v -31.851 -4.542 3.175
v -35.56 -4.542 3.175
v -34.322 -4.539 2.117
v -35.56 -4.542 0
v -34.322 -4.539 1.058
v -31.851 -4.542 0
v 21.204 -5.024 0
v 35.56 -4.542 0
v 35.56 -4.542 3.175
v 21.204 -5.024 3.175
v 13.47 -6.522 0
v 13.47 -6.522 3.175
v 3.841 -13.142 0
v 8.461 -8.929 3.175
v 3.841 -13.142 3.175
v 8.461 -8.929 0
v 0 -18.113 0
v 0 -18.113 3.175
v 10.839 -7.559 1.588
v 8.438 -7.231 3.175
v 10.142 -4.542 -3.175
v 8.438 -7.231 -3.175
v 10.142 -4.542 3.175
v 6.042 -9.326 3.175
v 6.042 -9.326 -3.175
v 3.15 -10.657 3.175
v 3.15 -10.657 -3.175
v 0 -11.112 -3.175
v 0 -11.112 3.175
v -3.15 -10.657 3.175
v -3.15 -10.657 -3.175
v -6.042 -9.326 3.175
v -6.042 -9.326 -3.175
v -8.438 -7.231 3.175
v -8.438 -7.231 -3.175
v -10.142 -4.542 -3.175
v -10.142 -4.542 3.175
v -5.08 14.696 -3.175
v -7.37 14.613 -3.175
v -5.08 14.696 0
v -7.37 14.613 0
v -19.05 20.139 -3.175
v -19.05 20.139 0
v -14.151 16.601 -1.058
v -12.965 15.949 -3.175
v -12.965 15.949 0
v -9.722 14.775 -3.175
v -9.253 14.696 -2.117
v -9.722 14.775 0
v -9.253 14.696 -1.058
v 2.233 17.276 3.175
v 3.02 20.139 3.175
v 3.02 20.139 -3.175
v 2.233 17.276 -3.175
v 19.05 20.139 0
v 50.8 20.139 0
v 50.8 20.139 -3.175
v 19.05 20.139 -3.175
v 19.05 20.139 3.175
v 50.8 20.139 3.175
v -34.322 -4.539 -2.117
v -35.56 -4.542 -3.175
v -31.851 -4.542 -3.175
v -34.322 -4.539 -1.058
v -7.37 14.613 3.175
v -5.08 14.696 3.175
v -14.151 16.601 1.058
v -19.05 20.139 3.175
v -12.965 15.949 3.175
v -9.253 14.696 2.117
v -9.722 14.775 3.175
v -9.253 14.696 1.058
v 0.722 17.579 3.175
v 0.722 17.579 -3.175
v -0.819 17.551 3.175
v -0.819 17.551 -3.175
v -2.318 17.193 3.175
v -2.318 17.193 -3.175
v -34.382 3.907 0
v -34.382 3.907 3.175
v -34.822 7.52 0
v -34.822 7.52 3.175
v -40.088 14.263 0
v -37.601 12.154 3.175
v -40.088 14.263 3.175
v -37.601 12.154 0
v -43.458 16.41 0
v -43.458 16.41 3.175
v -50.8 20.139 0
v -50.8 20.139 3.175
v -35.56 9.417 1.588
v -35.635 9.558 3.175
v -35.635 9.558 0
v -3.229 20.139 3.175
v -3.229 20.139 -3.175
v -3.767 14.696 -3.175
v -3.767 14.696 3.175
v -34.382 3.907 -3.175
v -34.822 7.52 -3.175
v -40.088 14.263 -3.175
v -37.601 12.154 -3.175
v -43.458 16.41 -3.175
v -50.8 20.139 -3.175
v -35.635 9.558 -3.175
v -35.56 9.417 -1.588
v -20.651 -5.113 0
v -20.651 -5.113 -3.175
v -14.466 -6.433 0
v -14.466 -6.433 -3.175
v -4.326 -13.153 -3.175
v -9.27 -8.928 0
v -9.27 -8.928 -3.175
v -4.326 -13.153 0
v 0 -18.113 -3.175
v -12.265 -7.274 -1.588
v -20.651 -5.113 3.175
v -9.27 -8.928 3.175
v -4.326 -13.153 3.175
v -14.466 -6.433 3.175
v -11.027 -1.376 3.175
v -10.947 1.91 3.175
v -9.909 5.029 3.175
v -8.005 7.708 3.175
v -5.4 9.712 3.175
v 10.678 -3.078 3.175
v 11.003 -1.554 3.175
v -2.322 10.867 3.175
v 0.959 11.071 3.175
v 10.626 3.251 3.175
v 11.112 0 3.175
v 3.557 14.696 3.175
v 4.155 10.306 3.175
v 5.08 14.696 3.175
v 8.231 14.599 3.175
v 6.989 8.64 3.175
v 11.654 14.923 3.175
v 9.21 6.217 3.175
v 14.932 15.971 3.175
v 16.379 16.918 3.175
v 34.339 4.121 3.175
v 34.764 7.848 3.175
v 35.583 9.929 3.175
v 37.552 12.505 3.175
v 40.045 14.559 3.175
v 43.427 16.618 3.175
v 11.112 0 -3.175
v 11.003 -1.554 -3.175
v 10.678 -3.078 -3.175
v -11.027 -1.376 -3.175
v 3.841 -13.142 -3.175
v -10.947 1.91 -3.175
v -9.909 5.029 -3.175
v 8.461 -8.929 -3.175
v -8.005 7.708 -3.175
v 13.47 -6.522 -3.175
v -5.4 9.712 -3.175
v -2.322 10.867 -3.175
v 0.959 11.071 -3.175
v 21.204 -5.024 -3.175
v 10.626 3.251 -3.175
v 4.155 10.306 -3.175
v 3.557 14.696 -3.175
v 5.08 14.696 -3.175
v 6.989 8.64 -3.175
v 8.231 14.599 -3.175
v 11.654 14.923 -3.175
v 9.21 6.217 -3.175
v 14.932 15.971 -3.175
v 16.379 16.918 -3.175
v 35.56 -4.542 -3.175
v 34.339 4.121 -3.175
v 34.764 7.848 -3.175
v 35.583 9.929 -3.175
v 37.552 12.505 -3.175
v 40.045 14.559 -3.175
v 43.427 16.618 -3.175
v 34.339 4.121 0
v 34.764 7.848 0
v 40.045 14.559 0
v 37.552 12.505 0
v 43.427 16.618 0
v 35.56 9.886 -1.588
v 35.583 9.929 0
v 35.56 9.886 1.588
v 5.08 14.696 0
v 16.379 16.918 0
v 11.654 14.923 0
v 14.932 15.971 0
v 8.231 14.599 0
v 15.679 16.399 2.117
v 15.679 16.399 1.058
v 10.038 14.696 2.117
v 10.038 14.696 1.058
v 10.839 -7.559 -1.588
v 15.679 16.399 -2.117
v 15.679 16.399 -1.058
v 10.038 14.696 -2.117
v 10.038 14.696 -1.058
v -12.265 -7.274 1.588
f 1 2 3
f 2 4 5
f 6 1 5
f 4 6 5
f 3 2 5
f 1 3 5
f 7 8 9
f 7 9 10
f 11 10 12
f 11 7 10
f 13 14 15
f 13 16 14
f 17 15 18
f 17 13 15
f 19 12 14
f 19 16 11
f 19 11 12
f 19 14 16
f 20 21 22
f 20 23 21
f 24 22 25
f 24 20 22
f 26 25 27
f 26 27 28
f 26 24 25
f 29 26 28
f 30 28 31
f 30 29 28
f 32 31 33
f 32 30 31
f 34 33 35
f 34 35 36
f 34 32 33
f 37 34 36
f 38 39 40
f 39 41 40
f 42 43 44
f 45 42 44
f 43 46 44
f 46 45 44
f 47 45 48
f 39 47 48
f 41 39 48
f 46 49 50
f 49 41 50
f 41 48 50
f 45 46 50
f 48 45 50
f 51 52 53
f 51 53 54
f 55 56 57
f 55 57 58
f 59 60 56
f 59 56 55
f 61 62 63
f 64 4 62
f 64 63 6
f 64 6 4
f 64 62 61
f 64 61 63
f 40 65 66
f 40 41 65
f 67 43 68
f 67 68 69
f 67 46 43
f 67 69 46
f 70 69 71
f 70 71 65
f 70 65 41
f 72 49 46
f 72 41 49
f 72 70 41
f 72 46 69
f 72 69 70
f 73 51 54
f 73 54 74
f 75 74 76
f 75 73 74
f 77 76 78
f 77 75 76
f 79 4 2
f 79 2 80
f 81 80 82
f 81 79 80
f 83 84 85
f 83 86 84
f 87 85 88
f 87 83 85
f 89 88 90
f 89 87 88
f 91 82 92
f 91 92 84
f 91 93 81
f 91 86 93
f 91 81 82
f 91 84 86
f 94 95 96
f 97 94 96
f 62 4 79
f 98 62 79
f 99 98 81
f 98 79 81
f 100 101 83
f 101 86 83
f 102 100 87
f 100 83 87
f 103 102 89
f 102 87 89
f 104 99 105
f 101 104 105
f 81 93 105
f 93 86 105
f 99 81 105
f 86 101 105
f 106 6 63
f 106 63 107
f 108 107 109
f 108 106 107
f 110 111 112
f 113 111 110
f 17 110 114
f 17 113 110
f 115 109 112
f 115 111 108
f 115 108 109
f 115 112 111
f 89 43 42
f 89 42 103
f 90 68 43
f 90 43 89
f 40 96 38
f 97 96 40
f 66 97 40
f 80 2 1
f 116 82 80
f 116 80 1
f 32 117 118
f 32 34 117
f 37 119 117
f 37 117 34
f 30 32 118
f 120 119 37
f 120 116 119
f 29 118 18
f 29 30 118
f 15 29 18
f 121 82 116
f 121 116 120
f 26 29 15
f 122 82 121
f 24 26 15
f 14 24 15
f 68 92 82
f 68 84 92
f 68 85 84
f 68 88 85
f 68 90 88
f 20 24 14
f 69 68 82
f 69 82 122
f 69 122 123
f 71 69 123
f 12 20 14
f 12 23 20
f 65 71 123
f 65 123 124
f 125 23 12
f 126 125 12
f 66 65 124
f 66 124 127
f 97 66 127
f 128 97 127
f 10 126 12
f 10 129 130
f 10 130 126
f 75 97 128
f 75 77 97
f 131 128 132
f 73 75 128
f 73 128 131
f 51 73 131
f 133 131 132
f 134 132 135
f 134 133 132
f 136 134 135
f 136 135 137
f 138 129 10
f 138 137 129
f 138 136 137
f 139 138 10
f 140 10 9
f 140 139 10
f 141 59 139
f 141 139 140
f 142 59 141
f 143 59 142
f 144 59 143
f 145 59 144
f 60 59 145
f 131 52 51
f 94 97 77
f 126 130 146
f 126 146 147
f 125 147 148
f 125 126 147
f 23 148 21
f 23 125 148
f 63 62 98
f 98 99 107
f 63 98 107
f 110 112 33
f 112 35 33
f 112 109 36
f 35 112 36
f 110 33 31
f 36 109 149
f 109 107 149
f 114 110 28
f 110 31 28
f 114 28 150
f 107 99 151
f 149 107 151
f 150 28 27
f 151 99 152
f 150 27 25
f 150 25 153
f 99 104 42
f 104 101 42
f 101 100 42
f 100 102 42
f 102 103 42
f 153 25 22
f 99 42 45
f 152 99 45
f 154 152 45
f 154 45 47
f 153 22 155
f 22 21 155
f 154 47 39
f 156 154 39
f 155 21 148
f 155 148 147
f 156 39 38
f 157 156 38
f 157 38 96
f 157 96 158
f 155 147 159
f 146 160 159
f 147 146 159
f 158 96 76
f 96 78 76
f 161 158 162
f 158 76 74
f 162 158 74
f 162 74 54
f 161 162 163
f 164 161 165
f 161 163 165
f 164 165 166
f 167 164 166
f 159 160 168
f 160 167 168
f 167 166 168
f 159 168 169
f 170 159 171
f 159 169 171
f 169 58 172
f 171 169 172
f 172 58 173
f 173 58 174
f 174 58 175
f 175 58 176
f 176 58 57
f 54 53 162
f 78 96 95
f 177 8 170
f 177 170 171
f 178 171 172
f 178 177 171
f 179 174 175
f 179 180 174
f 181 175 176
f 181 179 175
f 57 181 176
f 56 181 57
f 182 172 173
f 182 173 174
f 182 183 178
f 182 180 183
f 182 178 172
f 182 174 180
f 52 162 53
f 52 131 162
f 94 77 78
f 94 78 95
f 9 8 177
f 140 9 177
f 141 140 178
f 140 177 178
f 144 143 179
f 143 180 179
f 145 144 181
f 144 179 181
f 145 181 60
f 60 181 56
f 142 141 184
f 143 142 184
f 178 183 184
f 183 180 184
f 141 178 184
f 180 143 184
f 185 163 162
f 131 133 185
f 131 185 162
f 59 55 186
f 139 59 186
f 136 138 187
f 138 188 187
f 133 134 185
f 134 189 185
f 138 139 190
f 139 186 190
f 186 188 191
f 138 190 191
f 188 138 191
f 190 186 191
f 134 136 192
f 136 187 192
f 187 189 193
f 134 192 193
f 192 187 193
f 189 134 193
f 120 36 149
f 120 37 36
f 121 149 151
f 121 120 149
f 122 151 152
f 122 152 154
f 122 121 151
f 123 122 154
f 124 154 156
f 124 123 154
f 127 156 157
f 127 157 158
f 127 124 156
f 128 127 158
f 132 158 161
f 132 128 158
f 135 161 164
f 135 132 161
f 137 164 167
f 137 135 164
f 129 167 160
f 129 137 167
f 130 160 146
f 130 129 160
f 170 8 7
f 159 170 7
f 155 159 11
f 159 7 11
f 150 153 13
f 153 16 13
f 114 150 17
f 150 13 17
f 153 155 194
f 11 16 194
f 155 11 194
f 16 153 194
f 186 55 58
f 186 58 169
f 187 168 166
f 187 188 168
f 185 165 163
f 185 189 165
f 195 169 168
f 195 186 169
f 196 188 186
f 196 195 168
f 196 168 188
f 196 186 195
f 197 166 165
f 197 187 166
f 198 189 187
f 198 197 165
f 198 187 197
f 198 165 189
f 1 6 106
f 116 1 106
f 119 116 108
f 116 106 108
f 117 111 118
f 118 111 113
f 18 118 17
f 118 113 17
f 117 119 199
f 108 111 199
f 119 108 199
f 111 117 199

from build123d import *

# Parameters (mm, degrees)
F1_DEPTH = 3.175
F2_DEPTH = 3.175
F3_DEPTH = 3.175


with BuildPart() as f1:
    # F0 (on Top) → F1 (new body, symmetric)
    with BuildSketch(Plane.XY):
        with BuildLine():
            Line((3.5574508365, 14.6957142279), (3.0195119325, 20.1385710388))
            Line((3.0195119325, 20.1385710388), (2.2332931403, 17.2757264227))
            ThreePointArc((2.2332931403, 17.2757264227), (-0.0493719254, 17.6066470309), (-2.3184989113, 17.192967236))
            Line((-2.3184989113, 17.192967236), (-3.2288574148, 20.1385710388))
            Line((-3.2288574148, 20.1385710388), (-3.7667965516, 14.6957142279))
            Line((-3.7667965516, 14.6957142279), (0, 14.6957142279))
            Line((0, 14.6957142279), (3.5574508365, 14.6957142279))
        make_face()
    extrude(amount=F1_DEPTH, both=True)

    # F0 (on Top) → F2 (join, symmetric)
    with BuildSketch(Plane.XY):
        with BuildLine():
            ThreePointArc((-10.1419678164, -4.5418217778), (-2.3221798908, 10.8671586353), (11.1125, 0))
            ThreePointArc((11.1125, 0), (10.8671586353, -2.3221798908), (10.1419678164, -4.5418217778))
            Line((10.1419678164, -4.5418217778), (35.56, -4.5418217778))
            add(Edge.make_bspline(
                [(35.56, -4.5418217778), (34.5022433012, 0.685898413), (32.2510367822, 11.8119709643), (44.3734498201, 17.2537028886), (50.8, 20.1385710388)],
                knots=[0, 0, 0, 0, 0.4698621339, 1, 1, 1, 1], degree=3))
            Line((50.8, 20.1385710388), (19.0499983728, 20.1385710388))
            add(Edge.make_bspline(
                [(19.0499983728, 20.1385710388), (18.0895831514, 18.7411490827), (16.0901457627, 15.8319306064), (10.0037733963, 14.4304926081), (6.6733221038, 14.6098891024), (5.08, 14.6957142279)],
                knots=[0, 0, 0, 0, 0.3252948954, 0.6772141484, 1, 1, 1, 1], degree=3))
            Line((5.08, 14.6957142279), (3.5574508365, 14.6957142279))
            Line((3.5574508365, 14.6957142279), (0, 14.6957142279))
            Line((0, 14.6957142279), (-3.7667965516, 14.6957142279))
            Line((-3.7667965516, 14.6957142279), (-5.08, 14.6957142279))
            add(Edge.make_bspline(
                [(-19.0500002354, 20.1385710388), (-17.4553554852, 18.8712979526), (-14.3743253141, 16.4419723526), (-9.3515014369, 14.268160703), (-6.4539154458, 14.6957142279), (-5.08, 14.6957142279)],
                knots=[0, 0, 0, 0, 0.3618398429, 0.6993072509, 1, 1, 1, 1], degree=3))
            Line((-19.0500002354, 20.1385710388), (-50.8, 20.1385710388))
            add(Edge.make_bspline(
                [(-35.56, -4.5418217778), (-34.540003535, 0.4730892703), (-32.3415476577, 11.2820097384), (-44.3584594123, 17.0478515123), (-50.8, 20.1385710388)],
                knots=[0, 0, 0, 0, 0.4639603985, 1, 1, 1, 1], degree=3))
            add(Edge.make_bspline(
                [(-35.56, -4.5418217778), (-34.3214025644, -4.538991022), (-33.0828051288, -4.5361602663), (-31.8513481835, -4.5418217778)],
                knots=[0, 0, 0, 0, 0.0789565916, 0.0789565916, 0.0789565916, 0.0789565916], degree=3))
            Line((-31.8513481835, -4.5418217778), (-10.1419678164, -4.5418217778))
        make_face()
    extrude(amount=F2_DEPTH, both=True)

    # F0 (on Top) → F3 (join, symmetric)
    with BuildSketch(Plane.XY):
        with BuildLine():
            ThreePointArc((10.1419678164, -4.5418217778), (0, -11.1125), (-10.1419678164, -4.5418217778))
            Line((-10.1419678164, -4.5418217778), (-31.8513481835, -4.5418217778))
            add(Edge.make_bspline(
                [(-31.8513481835, -4.5418217778), (-24.5851128605, -4.5752276353), (-10.7114219287, -5.2257985904), (-3.5426450812, -13.8506010071), (0, -18.1127805263)],
                knots=[0.0789565916, 0.0789565916, 0.0789565916, 0.0789565916, 0.5448414744, 1, 1, 1, 1], degree=3))
            add(Edge.make_bspline(
                [(35.56, -4.5418217778), (26.3068413271, -4.5617834301), (9.8417595326, -4.5973032185), (2.9977614729, -13.9960189831), (0, -18.1127805263)],
                knots=[0, 0, 0, 0, 0.5619868026, 1, 1, 1, 1], degree=3))
            Line((35.56, -4.5418217778), (10.1419678164, -4.5418217778))
        make_face()
    extrude(amount=F3_DEPTH, both=True)


solid = f1.part
